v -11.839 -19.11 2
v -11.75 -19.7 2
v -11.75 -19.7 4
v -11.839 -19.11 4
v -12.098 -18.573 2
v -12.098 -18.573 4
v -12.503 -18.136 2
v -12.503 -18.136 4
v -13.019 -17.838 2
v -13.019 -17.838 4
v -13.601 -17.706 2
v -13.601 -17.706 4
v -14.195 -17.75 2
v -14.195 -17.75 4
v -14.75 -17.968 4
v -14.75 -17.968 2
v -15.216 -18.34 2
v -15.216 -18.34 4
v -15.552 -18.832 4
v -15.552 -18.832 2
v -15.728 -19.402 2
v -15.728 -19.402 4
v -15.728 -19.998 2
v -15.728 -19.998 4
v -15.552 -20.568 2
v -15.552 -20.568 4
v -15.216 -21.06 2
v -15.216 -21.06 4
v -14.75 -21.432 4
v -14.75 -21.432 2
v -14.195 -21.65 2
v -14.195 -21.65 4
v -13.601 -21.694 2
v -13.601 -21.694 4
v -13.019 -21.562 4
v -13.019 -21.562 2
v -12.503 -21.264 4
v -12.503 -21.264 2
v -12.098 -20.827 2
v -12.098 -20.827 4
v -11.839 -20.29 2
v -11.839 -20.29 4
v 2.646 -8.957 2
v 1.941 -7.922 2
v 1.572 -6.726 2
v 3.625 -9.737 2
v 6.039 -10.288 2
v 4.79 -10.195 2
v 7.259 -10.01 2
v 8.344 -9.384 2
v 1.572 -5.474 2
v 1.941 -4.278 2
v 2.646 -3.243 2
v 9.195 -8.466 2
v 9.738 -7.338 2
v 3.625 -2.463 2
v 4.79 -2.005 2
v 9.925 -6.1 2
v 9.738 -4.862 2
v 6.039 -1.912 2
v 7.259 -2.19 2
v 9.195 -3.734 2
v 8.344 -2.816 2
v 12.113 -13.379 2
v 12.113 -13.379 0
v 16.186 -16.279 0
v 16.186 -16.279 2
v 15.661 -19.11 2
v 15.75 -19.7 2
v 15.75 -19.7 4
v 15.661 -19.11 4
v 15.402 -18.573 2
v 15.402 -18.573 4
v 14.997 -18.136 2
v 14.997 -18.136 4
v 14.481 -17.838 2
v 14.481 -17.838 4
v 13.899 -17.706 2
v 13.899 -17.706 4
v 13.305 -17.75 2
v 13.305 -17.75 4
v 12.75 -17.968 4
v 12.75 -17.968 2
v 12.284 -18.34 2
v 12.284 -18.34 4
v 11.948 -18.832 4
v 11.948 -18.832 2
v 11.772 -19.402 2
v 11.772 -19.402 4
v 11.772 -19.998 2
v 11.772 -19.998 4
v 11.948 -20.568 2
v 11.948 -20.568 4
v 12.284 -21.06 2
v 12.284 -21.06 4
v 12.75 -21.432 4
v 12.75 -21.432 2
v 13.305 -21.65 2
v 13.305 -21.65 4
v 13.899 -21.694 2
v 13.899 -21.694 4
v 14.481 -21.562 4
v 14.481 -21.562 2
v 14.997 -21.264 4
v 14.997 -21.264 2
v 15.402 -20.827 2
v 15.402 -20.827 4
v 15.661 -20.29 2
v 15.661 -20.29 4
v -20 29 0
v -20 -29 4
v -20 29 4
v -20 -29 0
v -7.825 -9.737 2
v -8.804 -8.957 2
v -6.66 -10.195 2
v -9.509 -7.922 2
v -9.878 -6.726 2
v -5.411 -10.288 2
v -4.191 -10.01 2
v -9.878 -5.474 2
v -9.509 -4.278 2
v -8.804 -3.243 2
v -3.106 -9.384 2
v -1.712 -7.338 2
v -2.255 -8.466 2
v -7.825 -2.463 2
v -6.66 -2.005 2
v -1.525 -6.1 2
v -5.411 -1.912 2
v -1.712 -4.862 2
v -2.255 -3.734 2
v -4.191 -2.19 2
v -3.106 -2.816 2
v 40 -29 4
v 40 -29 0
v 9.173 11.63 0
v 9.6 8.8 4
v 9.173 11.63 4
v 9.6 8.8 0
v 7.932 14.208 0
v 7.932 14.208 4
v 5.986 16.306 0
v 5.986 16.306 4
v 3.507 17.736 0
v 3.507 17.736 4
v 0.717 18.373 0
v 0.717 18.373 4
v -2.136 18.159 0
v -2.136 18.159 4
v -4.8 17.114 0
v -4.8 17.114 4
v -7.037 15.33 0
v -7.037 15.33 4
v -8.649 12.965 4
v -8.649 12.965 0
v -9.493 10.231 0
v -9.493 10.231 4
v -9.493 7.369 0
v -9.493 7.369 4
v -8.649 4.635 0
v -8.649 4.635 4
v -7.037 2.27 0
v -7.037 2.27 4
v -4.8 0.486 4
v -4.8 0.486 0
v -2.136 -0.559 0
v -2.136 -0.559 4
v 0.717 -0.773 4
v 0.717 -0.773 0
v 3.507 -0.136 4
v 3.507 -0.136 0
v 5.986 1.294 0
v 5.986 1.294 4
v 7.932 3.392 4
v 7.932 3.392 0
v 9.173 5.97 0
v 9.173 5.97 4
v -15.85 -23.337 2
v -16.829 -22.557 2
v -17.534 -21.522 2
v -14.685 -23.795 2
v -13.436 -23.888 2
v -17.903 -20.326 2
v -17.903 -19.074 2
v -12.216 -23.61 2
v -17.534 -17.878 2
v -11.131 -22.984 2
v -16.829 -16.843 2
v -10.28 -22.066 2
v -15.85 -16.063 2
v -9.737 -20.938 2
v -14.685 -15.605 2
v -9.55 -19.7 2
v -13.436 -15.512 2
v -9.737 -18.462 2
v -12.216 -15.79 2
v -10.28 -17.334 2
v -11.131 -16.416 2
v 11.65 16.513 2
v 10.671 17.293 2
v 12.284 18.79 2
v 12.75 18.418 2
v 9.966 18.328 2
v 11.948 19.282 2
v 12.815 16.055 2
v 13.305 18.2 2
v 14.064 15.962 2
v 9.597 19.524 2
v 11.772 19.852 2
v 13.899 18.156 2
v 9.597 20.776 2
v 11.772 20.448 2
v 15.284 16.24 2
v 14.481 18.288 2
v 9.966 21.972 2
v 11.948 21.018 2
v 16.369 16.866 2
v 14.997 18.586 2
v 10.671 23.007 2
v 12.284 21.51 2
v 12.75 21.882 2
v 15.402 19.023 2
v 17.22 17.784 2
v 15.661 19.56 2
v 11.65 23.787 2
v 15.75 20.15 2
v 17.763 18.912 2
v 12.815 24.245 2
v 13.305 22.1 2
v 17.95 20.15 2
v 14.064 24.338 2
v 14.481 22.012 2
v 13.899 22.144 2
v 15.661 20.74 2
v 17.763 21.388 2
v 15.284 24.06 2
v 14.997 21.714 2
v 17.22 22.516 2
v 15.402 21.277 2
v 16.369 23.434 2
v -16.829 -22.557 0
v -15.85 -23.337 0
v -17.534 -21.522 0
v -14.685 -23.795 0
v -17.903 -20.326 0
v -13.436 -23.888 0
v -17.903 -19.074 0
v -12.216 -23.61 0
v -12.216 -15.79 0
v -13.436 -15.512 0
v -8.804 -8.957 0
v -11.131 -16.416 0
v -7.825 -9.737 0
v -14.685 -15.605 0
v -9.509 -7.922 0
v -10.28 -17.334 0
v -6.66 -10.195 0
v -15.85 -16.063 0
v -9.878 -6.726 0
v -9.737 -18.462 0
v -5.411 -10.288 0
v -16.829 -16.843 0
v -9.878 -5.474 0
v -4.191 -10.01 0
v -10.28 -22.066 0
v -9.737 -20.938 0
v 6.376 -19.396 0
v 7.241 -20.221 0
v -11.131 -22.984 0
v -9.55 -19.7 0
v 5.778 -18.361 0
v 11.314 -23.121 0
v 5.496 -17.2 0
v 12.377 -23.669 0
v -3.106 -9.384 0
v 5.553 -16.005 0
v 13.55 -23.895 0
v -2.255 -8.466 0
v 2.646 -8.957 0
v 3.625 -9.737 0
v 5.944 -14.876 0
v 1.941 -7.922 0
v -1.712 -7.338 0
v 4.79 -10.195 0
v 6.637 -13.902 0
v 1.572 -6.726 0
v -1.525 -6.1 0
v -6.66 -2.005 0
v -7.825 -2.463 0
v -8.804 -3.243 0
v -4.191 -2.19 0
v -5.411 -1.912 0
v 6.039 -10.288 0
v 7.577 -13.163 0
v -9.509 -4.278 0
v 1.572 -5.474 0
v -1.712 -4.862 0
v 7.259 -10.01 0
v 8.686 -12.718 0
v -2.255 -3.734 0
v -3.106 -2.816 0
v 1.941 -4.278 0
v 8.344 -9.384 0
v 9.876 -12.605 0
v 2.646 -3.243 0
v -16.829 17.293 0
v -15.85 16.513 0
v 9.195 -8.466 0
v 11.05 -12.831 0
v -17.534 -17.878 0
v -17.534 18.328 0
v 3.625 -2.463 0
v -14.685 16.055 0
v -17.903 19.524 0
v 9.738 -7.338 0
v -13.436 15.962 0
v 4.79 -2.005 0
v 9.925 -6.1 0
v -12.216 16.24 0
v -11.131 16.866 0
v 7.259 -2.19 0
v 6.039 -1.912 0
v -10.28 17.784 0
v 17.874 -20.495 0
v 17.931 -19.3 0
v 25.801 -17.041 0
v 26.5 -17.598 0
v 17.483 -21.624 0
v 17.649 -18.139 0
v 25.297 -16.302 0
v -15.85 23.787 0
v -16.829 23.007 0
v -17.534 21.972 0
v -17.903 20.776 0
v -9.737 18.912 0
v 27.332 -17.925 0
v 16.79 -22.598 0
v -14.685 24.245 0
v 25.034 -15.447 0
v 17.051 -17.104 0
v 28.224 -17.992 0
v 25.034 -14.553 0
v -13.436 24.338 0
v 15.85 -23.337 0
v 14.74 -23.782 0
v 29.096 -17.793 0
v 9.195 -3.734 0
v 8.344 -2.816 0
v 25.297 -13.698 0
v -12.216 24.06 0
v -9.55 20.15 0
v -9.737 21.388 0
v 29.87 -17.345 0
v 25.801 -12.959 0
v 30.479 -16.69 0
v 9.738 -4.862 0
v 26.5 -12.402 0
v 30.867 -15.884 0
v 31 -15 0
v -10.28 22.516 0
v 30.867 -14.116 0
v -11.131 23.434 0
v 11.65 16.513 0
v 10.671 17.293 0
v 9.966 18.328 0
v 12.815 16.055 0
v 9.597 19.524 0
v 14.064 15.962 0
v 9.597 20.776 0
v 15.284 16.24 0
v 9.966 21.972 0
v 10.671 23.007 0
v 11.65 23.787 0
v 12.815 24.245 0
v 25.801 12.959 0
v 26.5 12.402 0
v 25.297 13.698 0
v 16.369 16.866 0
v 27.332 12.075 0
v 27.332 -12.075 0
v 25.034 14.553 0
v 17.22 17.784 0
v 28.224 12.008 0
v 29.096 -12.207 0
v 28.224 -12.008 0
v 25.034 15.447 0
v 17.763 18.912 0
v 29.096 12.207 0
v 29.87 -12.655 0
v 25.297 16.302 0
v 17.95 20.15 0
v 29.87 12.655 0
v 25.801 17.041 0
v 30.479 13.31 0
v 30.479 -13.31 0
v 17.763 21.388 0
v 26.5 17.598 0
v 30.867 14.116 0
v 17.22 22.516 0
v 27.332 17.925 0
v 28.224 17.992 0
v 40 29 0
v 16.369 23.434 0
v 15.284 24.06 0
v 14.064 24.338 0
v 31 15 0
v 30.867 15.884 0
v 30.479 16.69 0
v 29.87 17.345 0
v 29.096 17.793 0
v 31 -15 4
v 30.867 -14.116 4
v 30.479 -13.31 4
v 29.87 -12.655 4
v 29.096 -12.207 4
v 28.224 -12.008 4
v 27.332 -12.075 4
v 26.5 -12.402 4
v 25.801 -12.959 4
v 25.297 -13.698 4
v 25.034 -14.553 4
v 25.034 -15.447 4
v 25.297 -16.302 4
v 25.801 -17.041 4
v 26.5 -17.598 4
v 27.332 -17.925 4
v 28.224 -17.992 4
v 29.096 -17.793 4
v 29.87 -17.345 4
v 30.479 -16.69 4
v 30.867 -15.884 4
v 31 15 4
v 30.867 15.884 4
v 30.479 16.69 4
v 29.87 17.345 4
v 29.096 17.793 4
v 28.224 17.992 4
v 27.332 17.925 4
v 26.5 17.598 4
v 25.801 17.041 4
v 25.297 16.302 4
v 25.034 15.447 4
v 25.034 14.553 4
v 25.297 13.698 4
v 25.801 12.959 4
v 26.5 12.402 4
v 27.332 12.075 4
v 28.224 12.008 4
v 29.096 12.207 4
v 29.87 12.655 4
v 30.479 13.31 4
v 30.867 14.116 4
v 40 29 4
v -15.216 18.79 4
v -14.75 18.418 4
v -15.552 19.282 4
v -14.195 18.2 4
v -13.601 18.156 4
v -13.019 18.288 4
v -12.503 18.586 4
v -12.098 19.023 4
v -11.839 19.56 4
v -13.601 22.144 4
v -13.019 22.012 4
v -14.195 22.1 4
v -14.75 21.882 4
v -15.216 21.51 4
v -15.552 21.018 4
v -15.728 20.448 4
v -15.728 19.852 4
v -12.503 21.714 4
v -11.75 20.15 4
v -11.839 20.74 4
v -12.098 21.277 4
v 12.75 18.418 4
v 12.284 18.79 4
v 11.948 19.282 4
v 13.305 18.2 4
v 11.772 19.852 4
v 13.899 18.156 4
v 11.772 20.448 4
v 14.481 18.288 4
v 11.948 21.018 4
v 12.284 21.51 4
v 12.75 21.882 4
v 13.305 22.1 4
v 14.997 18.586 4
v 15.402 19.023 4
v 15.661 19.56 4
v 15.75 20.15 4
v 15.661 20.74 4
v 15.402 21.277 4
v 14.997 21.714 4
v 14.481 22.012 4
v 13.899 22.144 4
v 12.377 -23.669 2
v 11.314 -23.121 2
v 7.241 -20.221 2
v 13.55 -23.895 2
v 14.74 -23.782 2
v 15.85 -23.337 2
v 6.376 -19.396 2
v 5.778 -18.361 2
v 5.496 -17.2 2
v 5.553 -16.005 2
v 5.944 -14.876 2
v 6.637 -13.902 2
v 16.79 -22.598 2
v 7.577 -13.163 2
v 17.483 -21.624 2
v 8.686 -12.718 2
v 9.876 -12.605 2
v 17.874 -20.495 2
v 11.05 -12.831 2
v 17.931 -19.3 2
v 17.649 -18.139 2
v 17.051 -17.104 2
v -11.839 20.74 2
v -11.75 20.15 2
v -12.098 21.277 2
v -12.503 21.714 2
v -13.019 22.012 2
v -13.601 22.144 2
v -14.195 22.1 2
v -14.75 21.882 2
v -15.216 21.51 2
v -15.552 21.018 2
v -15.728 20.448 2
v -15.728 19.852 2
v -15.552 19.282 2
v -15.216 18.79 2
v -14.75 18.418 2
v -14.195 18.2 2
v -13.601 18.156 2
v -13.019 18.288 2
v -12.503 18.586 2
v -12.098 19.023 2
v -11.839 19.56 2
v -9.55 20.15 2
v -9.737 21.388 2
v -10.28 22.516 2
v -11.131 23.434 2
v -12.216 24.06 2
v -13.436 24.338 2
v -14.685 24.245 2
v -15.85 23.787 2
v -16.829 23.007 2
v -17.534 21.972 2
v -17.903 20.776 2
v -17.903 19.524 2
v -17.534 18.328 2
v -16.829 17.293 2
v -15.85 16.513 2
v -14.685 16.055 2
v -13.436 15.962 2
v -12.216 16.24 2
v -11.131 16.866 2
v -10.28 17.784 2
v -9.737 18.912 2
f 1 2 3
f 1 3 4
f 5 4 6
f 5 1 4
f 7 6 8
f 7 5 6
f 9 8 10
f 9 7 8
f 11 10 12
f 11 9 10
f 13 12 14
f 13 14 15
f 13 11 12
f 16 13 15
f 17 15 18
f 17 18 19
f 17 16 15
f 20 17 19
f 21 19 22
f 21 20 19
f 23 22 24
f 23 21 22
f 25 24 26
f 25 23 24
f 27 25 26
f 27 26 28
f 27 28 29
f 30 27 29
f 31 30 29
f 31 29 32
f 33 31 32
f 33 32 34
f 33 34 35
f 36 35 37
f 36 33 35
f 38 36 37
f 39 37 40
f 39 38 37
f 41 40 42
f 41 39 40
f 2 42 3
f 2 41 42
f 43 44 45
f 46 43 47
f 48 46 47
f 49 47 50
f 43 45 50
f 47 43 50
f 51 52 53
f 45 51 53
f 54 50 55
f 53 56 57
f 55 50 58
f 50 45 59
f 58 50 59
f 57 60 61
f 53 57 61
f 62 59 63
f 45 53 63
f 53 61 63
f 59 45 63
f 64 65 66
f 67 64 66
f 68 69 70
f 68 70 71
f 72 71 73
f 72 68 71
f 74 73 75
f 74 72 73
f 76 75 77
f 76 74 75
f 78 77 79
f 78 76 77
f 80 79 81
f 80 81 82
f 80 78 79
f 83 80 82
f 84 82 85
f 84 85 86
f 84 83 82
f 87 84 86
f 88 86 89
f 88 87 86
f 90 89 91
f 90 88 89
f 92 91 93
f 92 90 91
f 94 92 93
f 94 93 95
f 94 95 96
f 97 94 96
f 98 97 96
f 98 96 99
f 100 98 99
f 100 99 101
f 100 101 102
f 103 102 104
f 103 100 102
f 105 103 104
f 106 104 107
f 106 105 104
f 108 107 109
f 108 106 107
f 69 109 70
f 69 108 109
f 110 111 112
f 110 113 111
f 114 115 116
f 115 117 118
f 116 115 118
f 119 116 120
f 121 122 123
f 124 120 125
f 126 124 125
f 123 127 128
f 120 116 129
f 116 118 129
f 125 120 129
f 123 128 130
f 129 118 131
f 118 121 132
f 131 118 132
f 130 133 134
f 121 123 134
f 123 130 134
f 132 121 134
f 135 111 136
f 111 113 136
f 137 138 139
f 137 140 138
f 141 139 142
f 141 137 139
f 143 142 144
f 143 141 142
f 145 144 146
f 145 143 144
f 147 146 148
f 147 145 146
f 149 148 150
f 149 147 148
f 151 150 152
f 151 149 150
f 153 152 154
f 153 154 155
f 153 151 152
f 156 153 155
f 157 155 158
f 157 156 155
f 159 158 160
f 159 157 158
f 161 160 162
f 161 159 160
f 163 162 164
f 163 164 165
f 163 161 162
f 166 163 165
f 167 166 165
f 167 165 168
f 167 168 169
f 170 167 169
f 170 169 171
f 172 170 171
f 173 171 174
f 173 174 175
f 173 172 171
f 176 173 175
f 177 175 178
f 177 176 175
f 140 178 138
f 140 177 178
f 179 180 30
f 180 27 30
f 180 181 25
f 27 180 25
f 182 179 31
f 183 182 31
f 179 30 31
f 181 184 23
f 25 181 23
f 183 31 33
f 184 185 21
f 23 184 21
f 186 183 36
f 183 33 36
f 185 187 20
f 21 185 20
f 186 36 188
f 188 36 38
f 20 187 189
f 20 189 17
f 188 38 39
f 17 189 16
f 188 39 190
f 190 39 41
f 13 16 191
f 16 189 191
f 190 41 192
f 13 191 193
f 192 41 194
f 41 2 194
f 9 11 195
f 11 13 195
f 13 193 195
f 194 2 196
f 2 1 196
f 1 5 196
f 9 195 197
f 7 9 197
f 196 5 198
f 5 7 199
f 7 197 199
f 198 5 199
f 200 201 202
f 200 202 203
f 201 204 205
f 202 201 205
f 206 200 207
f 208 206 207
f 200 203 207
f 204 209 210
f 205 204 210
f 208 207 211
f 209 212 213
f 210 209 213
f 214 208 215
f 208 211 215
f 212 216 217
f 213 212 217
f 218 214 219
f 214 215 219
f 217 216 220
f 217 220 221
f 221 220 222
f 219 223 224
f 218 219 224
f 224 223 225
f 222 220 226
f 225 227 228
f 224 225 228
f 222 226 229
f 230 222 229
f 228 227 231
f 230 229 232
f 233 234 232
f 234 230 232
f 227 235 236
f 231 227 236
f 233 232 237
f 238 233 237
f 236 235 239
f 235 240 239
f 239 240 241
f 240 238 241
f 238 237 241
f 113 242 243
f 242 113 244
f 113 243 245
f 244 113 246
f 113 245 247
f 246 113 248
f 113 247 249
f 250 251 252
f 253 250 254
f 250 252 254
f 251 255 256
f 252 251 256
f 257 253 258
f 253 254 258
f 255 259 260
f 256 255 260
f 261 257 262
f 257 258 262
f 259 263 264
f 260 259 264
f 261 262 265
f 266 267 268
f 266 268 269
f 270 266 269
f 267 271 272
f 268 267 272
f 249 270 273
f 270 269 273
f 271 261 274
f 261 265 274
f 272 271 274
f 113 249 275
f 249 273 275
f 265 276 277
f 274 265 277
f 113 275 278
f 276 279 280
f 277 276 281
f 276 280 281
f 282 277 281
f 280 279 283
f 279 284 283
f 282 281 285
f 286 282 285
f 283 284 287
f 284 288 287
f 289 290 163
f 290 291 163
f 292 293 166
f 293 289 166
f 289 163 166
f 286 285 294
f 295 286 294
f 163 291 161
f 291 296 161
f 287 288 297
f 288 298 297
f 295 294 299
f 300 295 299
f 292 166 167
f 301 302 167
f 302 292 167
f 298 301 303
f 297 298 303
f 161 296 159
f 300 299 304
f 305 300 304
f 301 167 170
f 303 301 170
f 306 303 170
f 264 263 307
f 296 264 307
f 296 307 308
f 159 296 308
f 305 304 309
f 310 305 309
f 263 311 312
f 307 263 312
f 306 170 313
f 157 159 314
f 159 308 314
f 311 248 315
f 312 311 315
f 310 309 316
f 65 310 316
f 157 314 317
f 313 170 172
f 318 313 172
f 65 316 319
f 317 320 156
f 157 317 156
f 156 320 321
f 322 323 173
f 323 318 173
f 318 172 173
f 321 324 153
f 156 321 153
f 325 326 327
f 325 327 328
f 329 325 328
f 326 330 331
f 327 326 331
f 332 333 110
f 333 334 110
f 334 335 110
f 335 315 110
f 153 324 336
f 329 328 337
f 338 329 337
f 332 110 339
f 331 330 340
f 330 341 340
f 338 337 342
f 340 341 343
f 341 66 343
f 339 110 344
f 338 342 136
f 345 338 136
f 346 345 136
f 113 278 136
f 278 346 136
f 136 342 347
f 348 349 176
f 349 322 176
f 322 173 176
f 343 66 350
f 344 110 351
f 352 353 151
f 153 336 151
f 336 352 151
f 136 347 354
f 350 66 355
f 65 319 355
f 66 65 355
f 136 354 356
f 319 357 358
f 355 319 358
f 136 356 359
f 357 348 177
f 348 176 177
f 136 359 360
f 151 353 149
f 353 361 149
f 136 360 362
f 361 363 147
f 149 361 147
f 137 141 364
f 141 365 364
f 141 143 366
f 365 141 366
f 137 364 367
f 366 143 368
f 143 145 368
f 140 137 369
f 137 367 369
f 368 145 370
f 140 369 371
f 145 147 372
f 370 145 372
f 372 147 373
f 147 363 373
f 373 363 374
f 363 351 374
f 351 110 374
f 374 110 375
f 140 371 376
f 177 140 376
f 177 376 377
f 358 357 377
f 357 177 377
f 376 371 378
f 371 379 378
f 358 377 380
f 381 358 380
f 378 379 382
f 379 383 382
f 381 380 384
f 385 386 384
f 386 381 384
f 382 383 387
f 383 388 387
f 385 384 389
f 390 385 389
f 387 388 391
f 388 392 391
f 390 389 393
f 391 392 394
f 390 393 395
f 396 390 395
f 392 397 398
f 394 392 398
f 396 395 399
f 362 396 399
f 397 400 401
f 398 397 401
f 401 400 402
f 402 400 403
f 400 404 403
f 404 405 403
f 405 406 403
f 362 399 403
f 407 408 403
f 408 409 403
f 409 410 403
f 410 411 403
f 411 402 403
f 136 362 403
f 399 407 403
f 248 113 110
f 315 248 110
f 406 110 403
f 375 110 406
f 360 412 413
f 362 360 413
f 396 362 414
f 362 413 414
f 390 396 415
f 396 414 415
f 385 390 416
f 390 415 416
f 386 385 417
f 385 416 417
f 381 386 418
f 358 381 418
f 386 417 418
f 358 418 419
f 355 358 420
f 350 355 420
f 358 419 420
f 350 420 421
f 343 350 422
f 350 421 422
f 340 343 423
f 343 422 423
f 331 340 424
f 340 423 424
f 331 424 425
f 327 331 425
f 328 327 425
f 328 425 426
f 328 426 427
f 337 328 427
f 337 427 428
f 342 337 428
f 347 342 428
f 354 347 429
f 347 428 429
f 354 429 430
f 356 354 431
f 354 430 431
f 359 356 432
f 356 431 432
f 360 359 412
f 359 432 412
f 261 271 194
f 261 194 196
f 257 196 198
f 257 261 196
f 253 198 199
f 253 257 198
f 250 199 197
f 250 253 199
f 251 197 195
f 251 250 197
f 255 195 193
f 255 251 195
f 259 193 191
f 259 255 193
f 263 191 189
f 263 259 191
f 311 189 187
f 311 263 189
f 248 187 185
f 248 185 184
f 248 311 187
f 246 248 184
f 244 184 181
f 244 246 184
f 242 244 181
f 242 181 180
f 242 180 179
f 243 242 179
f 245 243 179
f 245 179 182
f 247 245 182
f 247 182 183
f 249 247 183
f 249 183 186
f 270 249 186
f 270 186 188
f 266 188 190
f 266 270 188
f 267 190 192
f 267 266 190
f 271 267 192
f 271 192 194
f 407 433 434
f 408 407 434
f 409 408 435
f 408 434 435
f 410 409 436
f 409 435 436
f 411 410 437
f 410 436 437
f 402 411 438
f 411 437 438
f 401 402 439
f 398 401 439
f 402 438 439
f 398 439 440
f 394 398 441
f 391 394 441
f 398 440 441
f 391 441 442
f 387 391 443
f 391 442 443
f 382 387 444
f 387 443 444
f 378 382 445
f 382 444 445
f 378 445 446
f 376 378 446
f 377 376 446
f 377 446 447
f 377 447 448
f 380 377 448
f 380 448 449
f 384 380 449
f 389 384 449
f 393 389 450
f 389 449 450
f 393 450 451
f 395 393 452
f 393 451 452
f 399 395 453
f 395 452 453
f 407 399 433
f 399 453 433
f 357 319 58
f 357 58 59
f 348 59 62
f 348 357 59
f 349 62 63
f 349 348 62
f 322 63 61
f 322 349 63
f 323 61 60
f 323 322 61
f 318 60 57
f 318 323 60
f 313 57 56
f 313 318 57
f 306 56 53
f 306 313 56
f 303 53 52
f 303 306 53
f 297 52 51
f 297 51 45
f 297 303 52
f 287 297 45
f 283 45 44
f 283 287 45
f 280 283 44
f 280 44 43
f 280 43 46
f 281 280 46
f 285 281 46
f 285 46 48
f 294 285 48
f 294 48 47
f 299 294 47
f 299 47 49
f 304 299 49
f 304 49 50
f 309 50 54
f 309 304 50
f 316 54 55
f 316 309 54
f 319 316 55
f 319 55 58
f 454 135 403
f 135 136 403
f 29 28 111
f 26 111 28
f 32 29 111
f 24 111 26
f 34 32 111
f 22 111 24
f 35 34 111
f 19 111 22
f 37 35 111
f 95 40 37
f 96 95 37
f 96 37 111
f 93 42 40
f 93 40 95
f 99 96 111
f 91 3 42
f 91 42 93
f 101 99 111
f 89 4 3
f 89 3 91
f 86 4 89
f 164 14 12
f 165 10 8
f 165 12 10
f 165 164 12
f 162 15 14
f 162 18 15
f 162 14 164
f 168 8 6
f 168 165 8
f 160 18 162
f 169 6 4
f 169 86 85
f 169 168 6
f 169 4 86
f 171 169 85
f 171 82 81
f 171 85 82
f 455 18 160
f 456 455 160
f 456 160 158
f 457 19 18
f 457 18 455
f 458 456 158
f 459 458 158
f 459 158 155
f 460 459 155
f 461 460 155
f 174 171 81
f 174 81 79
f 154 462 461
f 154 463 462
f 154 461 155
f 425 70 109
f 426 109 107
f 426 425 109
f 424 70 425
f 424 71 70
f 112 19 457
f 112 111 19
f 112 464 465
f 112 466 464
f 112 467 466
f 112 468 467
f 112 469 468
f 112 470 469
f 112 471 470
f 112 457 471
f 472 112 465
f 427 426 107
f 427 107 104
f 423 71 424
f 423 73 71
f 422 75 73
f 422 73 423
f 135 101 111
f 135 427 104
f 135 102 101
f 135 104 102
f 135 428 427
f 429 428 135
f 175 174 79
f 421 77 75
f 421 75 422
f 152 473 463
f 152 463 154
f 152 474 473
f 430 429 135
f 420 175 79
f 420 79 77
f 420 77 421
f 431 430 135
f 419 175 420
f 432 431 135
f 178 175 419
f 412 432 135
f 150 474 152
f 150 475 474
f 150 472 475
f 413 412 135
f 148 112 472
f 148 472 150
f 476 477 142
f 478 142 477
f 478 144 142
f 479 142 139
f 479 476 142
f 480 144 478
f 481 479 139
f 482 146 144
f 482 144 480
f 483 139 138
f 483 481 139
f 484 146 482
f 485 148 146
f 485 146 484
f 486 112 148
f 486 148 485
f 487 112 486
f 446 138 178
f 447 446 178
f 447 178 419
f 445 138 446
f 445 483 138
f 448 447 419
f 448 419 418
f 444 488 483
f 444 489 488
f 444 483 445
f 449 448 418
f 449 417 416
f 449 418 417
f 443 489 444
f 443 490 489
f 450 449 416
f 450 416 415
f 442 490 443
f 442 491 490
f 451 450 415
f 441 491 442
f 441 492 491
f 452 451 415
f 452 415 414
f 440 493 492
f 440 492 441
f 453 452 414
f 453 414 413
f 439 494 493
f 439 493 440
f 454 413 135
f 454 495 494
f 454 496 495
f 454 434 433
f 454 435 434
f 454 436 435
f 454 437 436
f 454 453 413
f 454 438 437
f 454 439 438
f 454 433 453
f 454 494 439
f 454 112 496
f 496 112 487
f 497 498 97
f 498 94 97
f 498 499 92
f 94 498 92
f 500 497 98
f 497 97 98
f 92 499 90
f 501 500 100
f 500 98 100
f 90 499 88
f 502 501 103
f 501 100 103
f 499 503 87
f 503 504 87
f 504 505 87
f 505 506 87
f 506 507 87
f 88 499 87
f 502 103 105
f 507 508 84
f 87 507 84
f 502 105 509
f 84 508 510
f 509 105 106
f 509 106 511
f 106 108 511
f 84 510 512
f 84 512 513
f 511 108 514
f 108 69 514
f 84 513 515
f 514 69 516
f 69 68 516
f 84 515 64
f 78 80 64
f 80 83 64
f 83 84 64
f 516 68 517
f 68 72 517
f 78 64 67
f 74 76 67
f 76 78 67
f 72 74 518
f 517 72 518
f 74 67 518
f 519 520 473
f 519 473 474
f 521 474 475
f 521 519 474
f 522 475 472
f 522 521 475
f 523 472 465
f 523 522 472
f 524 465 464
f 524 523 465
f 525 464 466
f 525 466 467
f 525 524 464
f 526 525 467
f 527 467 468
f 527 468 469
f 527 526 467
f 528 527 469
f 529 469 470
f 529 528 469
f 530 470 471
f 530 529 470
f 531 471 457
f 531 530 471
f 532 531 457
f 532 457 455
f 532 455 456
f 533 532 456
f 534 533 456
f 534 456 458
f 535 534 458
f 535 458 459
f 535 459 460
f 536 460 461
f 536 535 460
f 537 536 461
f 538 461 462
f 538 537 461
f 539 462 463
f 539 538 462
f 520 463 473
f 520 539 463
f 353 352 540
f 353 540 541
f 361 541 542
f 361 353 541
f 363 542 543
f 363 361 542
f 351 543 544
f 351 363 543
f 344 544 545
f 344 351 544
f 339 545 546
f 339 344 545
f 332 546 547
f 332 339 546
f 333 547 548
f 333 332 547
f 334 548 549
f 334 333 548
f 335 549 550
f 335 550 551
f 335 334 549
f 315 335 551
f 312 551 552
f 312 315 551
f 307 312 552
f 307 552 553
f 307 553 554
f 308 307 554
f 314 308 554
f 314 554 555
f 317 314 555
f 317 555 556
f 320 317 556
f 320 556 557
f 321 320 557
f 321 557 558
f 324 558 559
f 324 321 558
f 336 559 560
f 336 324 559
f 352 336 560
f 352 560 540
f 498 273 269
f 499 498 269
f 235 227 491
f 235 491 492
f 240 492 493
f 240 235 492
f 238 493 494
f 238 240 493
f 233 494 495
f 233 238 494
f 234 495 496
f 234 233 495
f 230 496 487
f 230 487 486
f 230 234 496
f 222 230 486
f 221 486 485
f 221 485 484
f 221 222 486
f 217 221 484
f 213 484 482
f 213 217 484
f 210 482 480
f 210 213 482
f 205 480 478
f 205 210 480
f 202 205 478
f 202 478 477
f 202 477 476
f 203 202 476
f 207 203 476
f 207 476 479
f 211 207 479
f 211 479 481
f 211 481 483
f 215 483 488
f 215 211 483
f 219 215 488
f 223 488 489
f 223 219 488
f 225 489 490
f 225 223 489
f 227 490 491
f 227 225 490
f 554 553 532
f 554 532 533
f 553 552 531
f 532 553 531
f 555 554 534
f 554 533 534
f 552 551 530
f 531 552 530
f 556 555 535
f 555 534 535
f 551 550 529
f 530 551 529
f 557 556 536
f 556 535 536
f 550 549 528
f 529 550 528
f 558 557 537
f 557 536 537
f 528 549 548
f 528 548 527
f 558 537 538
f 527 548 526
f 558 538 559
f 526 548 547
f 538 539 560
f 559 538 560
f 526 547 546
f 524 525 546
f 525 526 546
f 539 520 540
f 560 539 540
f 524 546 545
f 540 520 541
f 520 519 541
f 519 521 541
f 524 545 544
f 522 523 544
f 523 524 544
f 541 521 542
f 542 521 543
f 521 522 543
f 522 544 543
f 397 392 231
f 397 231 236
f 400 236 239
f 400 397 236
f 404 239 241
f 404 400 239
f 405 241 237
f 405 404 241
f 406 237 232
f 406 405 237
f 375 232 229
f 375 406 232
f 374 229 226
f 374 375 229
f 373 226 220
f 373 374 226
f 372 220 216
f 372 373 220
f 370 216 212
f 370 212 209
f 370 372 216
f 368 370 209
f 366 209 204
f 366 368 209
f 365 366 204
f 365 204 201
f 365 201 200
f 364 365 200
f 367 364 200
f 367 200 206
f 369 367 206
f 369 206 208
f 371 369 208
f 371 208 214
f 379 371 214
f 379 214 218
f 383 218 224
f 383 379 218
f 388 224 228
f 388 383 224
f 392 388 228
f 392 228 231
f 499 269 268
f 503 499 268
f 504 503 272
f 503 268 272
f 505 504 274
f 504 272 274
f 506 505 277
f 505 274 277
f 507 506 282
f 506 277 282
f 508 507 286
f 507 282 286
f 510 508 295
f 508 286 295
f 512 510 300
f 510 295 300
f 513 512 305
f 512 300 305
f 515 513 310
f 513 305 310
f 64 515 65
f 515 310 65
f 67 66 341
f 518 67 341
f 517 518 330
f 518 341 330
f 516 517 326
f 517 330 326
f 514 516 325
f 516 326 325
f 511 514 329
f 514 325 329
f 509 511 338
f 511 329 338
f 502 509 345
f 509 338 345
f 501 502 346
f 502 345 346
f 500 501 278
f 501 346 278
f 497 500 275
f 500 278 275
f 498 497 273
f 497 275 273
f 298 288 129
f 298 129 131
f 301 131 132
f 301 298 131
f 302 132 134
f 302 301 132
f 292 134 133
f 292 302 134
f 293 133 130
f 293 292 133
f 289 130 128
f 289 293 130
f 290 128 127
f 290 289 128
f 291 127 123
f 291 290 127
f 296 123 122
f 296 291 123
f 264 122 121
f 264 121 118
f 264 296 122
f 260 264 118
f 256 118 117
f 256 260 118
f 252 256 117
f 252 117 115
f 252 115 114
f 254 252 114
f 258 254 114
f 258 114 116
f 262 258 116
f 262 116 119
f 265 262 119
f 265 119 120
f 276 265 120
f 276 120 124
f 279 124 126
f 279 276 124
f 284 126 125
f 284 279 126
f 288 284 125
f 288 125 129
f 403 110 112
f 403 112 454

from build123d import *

# Parameters (mm, degrees)
SKETCH1_W           = 60
SKETCH1_H           = 58
SKETCH1_R           = 4.2
SKETCH1_R_2         = 9.6
BOSS_EXTRUDE1_DEPTH = 2
SKETCH4_W           = 60
SKETCH4_H           = 58
SKETCH4_R           = 2
SKETCH4_R_2         = 9.6
BOSS_EXTRUDE3_DEPTH = 2
SKETCH5_R           = 3
CUT_EXTRUDE1_DEPTH  = 4


with BuildPart() as part:
    # Sketch1 → Boss-Extrude1 (new body)
    with BuildSketch(Plane.XY):
        with Locations((10, 0)):
            Rectangle(SKETCH1_W, SKETCH1_H)
        with Locations((13.75, 20.15)):
            Circle(SKETCH1_R, mode=Mode.SUBTRACT)
        with Locations((-13.75, -19.7)):
            Circle(SKETCH1_R, mode=Mode.SUBTRACT)
        with Locations((-5.725, -6.1)):
            Circle(SKETCH1_R, mode=Mode.SUBTRACT)
        with Locations((5.725, -6.1)):
            Circle(SKETCH1_R, mode=Mode.SUBTRACT)
        with BuildLine():
            ThreePointArc((16.186, -16.278610808), (17.171389192, -22.136), (11.314, -23.121389192))
            Line((11.314, -23.121389192), (7.240917629, -20.221389192))
            ThreePointArc((7.240917629, -20.221389192), (6.255528438, -14.364), (12.112917629, -13.378610808))
            Line((12.112917629, -13.378610808), (16.186, -16.278610808))
        make_face(mode=Mode.SUBTRACT)
        with Locations((0, 8.8)):
            Circle(SKETCH1_R_2, mode=Mode.SUBTRACT)
        with Locations((-13.75, 20.15)):
            Circle(SKETCH1_R, mode=Mode.SUBTRACT)
    extrude(amount=BOSS_EXTRUDE1_DEPTH)

    # Sketch4 → Boss-Extrude3 (add)
    with BuildSketch(Plane.XY.offset(2)):
        with Locations((10, 0)):
            Rectangle(SKETCH4_W, SKETCH4_H)
        with Locations((-13.75, -19.7)):
            Circle(SKETCH4_R, mode=Mode.SUBTRACT)
        with Locations((-13.75, 20.15)):
            Circle(SKETCH4_R, mode=Mode.SUBTRACT)
        with Locations((13.75, 20.15)):
            Circle(SKETCH4_R, mode=Mode.SUBTRACT)
        with Locations((13.75, -19.7)):
            Circle(SKETCH4_R, mode=Mode.SUBTRACT)
        with Locations((0, 8.8)):
            Circle(SKETCH4_R_2, mode=Mode.SUBTRACT)
    extrude(amount=BOSS_EXTRUDE3_DEPTH)

    # Sketch5 → Cut-Extrude1 (cut)
    with BuildSketch(Plane.XY.offset(4)):
        with Locations((28, 15)):
            Circle(SKETCH5_R)
        with Locations((28, -15)):
            Circle(SKETCH5_R)
    extrude(amount=-CUT_EXTRUDE1_DEPTH, mode=Mode.SUBTRACT)


solid = part.part
